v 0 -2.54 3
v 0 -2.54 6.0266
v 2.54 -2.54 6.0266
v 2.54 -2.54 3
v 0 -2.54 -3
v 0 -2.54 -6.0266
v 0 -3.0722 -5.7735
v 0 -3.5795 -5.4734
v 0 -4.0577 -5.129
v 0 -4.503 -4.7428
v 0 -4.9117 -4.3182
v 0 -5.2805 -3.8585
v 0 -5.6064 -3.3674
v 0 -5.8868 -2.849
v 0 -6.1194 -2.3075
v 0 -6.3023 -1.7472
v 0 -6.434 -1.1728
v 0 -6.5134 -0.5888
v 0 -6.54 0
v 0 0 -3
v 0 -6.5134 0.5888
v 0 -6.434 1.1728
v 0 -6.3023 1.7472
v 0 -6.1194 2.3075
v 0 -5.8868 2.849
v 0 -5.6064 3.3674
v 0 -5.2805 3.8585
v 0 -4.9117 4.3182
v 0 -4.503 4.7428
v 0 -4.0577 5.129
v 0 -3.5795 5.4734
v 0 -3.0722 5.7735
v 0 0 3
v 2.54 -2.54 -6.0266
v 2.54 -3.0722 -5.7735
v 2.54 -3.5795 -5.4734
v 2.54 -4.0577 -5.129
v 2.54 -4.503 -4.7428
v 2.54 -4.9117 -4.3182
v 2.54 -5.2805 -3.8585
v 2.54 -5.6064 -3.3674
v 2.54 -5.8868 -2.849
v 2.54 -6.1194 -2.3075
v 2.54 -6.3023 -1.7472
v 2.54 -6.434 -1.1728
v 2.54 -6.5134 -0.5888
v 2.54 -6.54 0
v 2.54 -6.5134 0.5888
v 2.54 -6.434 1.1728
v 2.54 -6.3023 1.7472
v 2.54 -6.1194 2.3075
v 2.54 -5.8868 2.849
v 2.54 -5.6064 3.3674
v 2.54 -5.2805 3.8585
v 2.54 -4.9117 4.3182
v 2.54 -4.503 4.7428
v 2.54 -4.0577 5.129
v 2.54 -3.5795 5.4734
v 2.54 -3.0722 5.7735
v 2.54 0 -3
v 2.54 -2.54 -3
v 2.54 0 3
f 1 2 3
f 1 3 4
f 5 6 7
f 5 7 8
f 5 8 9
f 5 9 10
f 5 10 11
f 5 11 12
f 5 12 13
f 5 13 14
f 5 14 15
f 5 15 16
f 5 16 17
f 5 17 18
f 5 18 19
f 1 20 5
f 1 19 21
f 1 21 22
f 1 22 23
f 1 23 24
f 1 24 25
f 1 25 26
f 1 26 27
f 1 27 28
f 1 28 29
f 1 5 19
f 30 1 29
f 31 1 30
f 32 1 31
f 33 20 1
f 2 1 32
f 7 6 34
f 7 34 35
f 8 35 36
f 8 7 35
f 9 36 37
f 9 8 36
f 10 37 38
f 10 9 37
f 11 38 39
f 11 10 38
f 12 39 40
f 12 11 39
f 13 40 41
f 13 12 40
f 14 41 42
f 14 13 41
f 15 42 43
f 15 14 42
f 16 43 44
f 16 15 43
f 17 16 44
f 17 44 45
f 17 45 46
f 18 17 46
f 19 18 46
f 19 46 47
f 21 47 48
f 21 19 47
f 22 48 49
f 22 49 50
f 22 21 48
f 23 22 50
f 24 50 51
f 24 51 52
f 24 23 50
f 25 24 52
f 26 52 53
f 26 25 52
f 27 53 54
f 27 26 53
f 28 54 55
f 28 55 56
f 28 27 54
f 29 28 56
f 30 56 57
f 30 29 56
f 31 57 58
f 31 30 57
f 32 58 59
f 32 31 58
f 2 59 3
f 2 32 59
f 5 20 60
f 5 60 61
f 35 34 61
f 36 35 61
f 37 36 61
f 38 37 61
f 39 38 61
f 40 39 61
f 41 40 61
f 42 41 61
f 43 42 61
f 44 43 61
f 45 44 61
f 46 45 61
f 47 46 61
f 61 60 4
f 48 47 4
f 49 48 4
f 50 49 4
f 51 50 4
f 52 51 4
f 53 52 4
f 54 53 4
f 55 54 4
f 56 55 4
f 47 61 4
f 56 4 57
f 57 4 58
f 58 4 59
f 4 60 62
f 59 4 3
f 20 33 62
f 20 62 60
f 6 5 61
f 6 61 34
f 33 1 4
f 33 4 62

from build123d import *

# Parameters (mm, degrees)
BASE_DEPTH = 2.54


with BuildPart() as part:
    # Sketch1 → Base (new body)
    with BuildSketch(Plane(origin=(0, 0, 0), x_dir=(0, 0, -1), z_dir=(1, 0, 0))):
        with BuildLine():
            Line((-3, 0), (3, 0))
            Line((3, 0), (3, -2.54))
            Line((3, -2.54), (6.026607669, -2.54))
            ThreePointArc((6.026607669, -2.54), (0, -6.54), (-6.026607669, -2.54))
            Line((-6.026607669, -2.54), (-3, -2.54))
            Line((-3, -2.54), (-3, 0))
        make_face()
    extrude(amount=BASE_DEPTH)


solid = part.part
